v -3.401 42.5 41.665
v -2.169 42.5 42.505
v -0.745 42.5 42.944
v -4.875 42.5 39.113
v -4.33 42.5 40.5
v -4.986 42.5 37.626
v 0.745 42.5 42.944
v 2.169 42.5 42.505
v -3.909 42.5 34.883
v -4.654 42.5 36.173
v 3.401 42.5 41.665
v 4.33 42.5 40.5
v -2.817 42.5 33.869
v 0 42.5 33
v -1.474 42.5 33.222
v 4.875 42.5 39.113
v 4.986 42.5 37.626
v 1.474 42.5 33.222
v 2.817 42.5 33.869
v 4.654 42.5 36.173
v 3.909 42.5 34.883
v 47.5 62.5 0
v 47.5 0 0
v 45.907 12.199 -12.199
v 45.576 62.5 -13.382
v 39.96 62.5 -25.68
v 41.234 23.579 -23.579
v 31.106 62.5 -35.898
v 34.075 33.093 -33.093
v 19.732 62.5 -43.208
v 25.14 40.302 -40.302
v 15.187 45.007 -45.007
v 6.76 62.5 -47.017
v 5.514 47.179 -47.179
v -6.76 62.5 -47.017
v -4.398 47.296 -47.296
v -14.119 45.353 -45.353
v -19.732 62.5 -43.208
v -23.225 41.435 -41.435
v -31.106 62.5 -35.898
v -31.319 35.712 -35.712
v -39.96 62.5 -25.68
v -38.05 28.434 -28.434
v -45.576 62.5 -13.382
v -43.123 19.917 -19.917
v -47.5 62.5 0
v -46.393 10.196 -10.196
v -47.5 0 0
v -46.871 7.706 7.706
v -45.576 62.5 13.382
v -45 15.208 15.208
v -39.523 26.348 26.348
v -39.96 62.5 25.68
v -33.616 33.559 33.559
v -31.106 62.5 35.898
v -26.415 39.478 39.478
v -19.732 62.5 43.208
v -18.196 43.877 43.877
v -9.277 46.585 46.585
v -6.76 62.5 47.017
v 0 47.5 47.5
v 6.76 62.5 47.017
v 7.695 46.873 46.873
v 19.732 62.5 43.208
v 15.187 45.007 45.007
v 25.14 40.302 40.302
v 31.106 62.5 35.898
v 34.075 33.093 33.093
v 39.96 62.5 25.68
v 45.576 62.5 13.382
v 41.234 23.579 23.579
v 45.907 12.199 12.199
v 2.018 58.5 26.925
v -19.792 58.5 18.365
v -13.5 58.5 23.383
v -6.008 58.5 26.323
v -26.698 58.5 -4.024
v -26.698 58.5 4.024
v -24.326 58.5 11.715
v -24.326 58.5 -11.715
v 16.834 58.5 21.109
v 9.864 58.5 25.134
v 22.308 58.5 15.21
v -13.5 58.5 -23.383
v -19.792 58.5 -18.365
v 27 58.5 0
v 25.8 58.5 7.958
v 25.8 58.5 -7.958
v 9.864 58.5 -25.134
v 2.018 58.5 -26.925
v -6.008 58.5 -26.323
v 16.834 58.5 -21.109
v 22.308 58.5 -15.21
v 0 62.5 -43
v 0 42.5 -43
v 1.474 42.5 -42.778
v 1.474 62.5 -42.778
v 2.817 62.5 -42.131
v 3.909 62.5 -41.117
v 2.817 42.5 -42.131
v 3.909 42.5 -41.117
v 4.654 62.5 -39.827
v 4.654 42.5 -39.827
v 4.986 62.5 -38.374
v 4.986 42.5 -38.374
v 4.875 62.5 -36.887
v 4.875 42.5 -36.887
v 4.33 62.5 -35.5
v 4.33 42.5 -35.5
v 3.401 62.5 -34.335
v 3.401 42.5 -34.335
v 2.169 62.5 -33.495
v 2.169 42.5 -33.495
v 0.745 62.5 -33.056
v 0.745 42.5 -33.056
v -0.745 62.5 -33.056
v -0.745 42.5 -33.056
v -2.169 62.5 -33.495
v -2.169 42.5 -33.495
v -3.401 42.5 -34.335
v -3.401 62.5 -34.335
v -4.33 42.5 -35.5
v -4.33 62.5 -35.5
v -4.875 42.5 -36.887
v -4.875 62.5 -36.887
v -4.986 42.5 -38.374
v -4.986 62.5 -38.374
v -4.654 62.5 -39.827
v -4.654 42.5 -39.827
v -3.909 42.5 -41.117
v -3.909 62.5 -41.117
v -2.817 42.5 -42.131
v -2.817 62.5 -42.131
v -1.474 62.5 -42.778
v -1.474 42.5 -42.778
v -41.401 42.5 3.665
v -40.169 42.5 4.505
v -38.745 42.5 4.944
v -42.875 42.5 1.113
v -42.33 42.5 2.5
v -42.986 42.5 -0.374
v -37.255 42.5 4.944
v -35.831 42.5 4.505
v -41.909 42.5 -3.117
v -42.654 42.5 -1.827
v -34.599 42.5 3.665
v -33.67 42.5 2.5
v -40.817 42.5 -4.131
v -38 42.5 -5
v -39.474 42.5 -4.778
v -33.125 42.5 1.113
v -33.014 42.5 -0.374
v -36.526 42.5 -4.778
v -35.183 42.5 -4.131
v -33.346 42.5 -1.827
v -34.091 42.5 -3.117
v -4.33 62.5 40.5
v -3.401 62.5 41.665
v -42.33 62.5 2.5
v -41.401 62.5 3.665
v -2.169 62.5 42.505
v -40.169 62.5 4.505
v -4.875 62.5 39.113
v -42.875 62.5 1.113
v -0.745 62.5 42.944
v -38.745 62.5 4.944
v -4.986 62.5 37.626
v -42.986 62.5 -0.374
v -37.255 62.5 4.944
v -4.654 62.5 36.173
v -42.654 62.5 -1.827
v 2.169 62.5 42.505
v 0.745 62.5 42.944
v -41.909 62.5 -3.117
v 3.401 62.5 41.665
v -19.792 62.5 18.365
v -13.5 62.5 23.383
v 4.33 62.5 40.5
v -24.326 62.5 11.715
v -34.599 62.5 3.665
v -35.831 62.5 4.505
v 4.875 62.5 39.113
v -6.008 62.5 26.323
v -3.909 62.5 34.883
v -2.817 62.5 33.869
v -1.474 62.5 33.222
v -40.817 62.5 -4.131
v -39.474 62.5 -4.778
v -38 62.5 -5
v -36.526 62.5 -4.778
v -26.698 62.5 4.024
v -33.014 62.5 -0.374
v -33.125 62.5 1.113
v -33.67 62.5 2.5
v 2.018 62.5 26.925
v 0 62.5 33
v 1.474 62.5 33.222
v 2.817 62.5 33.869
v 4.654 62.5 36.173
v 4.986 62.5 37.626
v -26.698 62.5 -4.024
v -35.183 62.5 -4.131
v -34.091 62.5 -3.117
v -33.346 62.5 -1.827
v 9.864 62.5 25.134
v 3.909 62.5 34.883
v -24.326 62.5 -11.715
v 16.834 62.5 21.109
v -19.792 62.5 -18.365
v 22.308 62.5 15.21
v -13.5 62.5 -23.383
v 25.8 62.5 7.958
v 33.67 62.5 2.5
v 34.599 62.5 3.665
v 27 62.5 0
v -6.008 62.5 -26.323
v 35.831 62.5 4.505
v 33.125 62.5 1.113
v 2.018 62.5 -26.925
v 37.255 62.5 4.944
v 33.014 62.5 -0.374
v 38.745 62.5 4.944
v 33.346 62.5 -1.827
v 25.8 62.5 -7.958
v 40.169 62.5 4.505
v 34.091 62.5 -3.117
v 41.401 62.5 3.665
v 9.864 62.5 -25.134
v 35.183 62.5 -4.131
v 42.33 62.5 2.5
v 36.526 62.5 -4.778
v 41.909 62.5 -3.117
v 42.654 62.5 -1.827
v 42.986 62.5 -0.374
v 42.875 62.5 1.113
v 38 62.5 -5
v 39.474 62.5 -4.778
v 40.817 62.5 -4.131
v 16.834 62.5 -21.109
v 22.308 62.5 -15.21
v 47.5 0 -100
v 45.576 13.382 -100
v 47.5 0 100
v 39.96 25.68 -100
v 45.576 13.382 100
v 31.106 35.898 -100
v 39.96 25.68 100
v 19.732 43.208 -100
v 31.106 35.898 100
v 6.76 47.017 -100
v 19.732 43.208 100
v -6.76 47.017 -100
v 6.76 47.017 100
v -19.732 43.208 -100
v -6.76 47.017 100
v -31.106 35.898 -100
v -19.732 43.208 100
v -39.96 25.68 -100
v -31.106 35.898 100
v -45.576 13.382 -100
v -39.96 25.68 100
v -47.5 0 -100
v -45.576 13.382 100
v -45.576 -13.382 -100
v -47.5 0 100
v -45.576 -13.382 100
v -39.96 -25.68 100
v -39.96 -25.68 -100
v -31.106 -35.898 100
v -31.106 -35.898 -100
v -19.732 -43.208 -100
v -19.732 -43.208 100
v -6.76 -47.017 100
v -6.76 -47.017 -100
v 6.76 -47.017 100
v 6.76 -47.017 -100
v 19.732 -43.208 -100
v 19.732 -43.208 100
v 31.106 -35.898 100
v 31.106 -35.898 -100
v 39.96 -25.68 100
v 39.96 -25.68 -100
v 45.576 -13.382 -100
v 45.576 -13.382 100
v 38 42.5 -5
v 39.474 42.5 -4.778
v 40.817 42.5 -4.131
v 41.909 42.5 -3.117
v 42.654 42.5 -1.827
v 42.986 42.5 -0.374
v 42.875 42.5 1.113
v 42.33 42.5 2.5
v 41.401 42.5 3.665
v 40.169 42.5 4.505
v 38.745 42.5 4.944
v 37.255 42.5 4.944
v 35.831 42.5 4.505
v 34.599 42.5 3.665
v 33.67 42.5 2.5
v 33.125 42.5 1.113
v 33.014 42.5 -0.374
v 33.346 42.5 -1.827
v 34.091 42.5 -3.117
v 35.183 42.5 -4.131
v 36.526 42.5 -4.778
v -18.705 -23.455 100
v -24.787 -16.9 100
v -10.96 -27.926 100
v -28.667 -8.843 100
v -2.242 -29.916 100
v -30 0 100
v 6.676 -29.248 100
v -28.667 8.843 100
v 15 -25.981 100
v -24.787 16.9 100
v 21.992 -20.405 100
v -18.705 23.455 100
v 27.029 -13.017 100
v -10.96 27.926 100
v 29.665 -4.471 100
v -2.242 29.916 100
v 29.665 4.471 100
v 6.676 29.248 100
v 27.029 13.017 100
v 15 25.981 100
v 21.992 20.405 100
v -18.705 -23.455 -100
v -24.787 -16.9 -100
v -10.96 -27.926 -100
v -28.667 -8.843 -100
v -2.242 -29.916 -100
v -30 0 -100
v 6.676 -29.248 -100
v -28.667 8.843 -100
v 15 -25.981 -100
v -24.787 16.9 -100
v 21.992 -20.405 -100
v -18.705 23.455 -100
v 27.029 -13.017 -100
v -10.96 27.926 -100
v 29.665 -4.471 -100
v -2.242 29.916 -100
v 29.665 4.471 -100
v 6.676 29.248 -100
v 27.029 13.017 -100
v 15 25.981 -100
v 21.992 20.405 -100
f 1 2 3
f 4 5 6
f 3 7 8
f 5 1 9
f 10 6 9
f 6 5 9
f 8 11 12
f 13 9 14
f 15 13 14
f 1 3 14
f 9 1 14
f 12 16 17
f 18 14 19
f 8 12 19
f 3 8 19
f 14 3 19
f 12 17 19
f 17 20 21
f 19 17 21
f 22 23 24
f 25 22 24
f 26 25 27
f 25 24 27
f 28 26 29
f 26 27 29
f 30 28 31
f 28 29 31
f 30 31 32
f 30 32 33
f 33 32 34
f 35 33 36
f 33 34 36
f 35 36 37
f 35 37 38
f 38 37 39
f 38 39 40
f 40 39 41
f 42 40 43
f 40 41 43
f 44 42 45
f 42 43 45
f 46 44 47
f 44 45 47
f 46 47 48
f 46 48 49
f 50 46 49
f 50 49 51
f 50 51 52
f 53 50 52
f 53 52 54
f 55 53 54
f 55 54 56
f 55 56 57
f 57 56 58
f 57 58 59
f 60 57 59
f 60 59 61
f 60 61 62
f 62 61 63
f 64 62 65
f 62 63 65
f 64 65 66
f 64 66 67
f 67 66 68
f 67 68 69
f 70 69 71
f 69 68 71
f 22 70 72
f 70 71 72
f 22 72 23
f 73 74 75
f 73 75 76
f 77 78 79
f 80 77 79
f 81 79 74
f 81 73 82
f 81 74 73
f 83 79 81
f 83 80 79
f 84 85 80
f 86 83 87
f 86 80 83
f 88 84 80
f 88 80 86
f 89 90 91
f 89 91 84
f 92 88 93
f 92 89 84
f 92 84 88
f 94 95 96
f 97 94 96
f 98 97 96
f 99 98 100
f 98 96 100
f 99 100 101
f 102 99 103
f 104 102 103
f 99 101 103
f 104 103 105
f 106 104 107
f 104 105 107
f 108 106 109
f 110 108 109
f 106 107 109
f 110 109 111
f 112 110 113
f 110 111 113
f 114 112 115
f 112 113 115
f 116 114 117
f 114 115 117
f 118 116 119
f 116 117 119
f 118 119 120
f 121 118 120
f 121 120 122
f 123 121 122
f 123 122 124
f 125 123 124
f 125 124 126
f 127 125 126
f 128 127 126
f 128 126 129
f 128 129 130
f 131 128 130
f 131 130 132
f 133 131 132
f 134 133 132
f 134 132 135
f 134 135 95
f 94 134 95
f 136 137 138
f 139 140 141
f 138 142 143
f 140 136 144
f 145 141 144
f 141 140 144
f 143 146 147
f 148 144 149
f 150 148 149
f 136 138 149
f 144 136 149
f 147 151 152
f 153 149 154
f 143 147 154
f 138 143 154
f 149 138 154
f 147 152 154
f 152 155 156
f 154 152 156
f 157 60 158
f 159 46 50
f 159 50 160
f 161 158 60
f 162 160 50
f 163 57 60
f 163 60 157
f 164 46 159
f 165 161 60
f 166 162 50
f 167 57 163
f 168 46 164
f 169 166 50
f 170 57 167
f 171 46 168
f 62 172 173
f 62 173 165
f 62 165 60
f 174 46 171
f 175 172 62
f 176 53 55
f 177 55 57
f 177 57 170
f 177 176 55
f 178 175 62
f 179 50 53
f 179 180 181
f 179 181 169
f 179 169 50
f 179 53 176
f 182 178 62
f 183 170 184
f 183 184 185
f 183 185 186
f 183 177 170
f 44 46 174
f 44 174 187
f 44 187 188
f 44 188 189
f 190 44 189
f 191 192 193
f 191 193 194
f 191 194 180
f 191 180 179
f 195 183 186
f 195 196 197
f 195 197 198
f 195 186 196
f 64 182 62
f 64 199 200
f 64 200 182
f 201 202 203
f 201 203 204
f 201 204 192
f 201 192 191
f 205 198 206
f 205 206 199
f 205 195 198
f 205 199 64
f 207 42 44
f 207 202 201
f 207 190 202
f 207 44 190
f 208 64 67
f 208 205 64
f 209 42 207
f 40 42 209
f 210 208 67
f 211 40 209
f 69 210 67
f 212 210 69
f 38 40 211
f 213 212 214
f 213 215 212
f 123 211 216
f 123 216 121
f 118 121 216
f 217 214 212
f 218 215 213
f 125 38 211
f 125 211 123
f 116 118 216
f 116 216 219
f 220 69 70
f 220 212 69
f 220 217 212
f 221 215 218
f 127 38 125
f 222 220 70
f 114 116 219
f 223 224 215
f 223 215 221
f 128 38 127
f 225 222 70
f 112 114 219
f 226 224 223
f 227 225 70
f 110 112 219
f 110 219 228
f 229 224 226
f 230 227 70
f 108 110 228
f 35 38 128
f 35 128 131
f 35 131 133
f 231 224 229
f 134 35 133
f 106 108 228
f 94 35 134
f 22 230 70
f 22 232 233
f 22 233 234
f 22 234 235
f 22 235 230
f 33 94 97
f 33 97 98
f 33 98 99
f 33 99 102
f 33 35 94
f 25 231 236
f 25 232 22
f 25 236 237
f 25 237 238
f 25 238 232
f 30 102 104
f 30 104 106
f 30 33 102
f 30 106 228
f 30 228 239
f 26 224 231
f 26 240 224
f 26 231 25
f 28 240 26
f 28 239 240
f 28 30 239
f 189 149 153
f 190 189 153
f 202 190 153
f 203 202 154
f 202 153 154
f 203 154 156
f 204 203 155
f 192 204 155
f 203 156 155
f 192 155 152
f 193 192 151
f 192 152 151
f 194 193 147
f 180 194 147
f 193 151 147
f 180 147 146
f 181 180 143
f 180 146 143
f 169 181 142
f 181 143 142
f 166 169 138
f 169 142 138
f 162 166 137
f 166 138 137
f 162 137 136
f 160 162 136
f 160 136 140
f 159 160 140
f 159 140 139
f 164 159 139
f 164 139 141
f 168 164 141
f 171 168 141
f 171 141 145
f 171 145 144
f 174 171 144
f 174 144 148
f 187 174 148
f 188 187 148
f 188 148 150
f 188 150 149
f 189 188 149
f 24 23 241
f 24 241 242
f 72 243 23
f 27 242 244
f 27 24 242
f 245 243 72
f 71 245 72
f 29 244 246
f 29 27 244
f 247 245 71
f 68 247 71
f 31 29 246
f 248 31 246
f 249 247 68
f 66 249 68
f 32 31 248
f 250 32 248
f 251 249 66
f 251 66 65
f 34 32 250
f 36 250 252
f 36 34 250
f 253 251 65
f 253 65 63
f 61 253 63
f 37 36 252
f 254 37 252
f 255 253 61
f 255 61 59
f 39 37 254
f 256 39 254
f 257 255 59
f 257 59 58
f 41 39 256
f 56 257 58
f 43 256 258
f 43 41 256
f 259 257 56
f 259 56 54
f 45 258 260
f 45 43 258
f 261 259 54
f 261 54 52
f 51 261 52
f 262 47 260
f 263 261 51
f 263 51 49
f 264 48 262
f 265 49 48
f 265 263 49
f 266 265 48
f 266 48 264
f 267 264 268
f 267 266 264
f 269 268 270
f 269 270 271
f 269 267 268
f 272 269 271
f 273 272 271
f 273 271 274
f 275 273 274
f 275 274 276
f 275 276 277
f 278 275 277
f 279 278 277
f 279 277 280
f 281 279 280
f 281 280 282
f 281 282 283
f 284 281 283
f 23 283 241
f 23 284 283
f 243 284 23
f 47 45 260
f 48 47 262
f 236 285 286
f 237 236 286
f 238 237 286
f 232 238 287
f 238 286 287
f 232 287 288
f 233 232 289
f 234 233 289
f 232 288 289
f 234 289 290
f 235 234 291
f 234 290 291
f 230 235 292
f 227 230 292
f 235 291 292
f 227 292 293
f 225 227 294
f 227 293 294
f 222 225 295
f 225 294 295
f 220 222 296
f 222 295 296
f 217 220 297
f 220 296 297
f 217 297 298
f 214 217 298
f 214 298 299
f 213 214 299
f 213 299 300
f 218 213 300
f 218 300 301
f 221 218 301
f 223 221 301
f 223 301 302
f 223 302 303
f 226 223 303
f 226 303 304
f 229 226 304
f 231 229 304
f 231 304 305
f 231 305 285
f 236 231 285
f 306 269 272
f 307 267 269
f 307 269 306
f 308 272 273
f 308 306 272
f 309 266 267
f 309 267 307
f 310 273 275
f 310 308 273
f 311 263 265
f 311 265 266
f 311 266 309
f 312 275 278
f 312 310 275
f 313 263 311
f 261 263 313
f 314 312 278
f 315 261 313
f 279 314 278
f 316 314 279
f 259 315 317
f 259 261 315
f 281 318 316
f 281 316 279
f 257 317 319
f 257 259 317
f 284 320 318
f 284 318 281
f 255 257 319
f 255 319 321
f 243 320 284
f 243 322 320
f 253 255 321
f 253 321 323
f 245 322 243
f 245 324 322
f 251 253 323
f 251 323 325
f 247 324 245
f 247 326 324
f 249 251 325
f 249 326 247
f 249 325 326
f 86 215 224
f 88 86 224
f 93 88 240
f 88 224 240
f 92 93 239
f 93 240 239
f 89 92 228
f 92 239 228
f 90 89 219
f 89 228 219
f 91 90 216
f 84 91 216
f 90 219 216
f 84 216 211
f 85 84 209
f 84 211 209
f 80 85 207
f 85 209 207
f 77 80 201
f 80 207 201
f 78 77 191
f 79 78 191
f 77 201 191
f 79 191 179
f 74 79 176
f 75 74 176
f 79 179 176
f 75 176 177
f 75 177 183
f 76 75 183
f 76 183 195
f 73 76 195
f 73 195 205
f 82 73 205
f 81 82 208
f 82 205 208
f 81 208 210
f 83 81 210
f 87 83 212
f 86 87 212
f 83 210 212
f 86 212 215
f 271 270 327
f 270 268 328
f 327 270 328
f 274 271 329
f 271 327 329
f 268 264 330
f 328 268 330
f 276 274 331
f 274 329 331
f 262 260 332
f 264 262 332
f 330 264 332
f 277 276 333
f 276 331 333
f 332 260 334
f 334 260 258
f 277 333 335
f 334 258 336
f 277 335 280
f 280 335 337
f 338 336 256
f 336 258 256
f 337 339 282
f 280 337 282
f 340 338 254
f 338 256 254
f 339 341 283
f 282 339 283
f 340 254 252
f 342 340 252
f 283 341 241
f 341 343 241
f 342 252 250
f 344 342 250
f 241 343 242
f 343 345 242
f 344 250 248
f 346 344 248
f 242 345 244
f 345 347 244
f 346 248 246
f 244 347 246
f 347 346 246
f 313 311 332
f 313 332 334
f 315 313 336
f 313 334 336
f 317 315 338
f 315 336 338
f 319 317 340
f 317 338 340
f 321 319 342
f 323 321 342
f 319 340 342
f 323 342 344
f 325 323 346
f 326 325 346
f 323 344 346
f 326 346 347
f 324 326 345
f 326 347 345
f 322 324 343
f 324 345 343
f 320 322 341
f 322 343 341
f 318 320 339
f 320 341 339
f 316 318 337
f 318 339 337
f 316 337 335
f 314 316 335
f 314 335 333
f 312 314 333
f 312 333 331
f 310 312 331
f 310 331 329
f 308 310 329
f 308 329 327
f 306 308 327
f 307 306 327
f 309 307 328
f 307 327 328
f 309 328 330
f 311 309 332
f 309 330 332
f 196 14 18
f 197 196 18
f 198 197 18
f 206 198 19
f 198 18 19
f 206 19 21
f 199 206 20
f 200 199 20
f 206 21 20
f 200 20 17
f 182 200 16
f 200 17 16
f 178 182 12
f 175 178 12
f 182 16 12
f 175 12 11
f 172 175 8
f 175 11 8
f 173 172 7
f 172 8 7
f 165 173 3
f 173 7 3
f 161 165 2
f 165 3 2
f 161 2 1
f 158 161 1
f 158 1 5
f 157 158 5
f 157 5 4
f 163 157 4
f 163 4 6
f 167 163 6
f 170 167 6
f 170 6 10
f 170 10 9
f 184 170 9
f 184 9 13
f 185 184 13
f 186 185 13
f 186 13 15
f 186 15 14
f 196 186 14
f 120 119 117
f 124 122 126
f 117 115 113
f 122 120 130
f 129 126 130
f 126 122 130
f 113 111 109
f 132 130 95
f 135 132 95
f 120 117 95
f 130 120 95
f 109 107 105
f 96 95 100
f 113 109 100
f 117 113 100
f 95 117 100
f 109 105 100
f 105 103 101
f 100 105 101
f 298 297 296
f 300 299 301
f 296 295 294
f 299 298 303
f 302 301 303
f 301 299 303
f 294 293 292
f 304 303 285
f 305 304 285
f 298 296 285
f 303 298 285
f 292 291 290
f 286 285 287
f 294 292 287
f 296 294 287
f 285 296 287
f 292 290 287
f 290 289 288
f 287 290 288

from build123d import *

# Parameters (mm, degrees)
SKETCH1_R           = 47.5
BOSS_EXTRUDE1_DEPTH = 100
SKETCH2_R           = 47.5
BOSS_EXTRUDE2_DEPTH = 62.5
SKETCH3_R           = 27
CUT_EXTRUDE1_DEPTH  = 4
HOLE1_D             = 10
HOLE1_DEPTH         = 20
SKETCH6_R           = 30
CUT_EXTRUDE2_DEPTH  = 200


with BuildPart() as part:
    # Sketch1 → Boss-Extrude1 (new body, symmetric)
    with BuildSketch(Plane.XY):
        Circle(SKETCH1_R)
    extrude(amount=BOSS_EXTRUDE1_DEPTH, both=True)

    # Sketch2 → Boss-Extrude2 (add)
    with BuildSketch(Plane(origin=(0, 0, 0), x_dir=(1, 0, 0), z_dir=(0, 1, 0))):
        Circle(SKETCH2_R)
    extrude(amount=BOSS_EXTRUDE2_DEPTH)

    # Sketch3 → Cut-Extrude1 (cut)
    with BuildSketch(Plane(origin=(0, 62.5, 0), x_dir=(1, 0, 0), z_dir=(0, 1, 0))):
        Circle(SKETCH3_R)
    extrude(amount=-CUT_EXTRUDE1_DEPTH, mode=Mode.SUBTRACT)

    # Hole1
    with Locations(Plane(origin=(38, 62.5, 0), x_dir=(0, 0, 1), z_dir=(0, 1, 0))):
        with Locations((0, 0), (-38, -38), (0, -76), (38, -38)):
            Hole(HOLE1_D / 2, depth=HOLE1_DEPTH)

    # Sketch6 → Cut-Extrude2 (cut)
    with BuildSketch(Plane(origin=(0, 0, -100), x_dir=(-1, 0, 0), z_dir=(0, 0, -1))):
        Circle(SKETCH6_R)
    extrude(amount=-CUT_EXTRUDE2_DEPTH, mode=Mode.SUBTRACT)


solid = part.part
